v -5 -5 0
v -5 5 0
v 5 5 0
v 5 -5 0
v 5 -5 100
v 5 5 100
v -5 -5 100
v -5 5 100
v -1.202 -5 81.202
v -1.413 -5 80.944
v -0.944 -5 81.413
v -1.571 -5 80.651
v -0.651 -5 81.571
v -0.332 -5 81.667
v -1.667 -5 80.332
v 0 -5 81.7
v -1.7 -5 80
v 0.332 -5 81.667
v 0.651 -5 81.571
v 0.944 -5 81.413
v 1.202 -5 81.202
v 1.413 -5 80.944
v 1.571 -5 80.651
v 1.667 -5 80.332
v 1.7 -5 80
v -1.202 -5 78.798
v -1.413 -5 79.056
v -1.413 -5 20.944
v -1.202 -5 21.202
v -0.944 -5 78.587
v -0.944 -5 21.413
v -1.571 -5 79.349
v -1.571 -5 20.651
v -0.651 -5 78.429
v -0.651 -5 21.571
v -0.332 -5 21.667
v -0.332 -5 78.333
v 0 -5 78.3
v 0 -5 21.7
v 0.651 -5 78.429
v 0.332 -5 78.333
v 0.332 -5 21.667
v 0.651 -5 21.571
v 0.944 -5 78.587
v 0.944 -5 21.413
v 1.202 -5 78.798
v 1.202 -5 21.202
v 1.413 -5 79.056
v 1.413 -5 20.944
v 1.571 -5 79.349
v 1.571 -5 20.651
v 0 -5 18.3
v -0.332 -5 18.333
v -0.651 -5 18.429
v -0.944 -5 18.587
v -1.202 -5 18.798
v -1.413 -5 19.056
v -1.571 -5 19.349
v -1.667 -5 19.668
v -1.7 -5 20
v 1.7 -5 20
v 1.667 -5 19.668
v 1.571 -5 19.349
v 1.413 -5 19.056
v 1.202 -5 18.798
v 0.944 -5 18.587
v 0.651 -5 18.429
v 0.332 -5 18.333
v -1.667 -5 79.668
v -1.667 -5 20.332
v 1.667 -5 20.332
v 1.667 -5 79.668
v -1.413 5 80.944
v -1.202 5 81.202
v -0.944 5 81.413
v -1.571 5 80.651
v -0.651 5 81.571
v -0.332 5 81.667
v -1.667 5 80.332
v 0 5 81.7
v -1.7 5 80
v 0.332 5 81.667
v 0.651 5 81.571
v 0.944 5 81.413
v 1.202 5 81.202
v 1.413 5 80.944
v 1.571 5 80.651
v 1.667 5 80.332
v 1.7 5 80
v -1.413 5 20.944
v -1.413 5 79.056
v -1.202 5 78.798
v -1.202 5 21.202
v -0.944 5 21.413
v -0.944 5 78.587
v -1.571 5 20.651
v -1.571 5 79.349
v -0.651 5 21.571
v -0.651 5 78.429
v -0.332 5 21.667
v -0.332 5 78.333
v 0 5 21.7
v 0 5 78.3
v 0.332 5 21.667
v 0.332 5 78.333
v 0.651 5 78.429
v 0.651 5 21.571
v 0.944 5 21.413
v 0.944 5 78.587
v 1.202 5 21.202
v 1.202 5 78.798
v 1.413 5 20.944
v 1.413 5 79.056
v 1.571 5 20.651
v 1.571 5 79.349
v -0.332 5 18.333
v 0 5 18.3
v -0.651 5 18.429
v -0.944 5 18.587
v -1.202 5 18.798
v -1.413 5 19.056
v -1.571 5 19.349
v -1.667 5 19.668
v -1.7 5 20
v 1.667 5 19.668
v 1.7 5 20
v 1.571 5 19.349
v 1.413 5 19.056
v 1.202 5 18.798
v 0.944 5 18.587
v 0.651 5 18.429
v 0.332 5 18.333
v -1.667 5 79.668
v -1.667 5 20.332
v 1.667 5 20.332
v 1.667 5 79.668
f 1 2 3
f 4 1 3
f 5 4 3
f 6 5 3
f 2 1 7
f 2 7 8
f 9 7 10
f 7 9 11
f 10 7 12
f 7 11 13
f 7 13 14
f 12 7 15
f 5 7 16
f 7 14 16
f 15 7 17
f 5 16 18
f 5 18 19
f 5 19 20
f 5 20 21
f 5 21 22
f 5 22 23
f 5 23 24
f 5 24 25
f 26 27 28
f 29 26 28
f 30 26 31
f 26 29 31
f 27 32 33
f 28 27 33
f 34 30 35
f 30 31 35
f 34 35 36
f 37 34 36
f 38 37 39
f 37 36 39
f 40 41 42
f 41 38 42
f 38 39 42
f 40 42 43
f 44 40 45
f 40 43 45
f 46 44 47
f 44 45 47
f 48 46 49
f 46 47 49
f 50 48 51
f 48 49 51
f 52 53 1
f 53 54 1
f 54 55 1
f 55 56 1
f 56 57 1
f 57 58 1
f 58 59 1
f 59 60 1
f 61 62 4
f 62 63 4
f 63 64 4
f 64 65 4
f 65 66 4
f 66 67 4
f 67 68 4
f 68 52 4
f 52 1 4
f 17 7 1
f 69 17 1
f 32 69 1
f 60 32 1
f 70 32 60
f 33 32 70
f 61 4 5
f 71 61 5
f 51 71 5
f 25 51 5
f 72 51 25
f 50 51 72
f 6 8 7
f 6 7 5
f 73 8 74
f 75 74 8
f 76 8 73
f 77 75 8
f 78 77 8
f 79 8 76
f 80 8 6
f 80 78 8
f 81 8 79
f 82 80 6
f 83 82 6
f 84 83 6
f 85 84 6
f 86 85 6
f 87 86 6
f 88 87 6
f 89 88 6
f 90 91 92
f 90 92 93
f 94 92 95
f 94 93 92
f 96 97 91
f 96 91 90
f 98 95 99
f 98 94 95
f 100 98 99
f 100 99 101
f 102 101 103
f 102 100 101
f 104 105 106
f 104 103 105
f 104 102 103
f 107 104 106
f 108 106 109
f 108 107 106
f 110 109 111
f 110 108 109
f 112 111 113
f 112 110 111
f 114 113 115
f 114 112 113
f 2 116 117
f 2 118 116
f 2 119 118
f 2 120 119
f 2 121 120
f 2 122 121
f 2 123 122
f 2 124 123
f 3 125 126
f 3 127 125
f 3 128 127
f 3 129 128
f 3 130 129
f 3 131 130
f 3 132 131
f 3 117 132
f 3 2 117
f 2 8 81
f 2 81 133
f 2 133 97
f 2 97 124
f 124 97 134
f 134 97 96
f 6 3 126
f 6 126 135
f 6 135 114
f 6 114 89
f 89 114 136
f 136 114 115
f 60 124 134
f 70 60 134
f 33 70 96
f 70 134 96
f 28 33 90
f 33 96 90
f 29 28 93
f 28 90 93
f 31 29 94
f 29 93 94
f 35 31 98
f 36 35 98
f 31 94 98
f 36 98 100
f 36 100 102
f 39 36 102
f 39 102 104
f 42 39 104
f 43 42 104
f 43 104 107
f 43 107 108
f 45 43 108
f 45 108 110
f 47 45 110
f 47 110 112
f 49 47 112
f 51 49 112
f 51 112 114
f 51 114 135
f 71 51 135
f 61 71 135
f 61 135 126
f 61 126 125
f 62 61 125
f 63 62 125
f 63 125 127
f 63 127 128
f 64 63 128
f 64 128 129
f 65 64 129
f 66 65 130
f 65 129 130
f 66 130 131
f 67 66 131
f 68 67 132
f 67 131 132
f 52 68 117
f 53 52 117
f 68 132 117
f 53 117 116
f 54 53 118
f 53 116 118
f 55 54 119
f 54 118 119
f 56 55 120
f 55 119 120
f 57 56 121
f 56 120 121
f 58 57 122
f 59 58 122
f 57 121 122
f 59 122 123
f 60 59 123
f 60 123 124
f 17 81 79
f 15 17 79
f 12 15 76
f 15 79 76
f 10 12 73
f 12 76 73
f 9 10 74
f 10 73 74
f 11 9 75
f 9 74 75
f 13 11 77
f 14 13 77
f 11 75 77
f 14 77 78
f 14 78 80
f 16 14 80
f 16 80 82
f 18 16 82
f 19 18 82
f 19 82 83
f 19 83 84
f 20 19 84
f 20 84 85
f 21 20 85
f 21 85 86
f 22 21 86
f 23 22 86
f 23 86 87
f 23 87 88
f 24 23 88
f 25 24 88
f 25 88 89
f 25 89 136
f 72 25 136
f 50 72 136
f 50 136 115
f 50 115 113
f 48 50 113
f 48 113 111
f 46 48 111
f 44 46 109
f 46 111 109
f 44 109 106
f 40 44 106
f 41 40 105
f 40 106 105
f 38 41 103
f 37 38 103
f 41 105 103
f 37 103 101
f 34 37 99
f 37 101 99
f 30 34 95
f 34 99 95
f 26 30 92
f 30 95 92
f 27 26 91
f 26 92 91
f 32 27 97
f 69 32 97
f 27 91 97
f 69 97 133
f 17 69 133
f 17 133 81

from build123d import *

# Parameters (mm, degrees)
F0_W     = 10
F0_H     = 10
F1_DEPTH = 100
F3_D     = 3.4


with BuildPart() as f1:
    # F0 (on Top) → F1 (new body)
    with BuildSketch(Plane.XY):
        Rectangle(F0_W, F0_H)
    extrude(amount=F1_DEPTH)

    # F3 (through all)
    with Locations(Plane.XZ.offset(5)):
        with Locations((0, 80), (0, 20)):
            Hole(F3_D / 2)


solid = f1.part
